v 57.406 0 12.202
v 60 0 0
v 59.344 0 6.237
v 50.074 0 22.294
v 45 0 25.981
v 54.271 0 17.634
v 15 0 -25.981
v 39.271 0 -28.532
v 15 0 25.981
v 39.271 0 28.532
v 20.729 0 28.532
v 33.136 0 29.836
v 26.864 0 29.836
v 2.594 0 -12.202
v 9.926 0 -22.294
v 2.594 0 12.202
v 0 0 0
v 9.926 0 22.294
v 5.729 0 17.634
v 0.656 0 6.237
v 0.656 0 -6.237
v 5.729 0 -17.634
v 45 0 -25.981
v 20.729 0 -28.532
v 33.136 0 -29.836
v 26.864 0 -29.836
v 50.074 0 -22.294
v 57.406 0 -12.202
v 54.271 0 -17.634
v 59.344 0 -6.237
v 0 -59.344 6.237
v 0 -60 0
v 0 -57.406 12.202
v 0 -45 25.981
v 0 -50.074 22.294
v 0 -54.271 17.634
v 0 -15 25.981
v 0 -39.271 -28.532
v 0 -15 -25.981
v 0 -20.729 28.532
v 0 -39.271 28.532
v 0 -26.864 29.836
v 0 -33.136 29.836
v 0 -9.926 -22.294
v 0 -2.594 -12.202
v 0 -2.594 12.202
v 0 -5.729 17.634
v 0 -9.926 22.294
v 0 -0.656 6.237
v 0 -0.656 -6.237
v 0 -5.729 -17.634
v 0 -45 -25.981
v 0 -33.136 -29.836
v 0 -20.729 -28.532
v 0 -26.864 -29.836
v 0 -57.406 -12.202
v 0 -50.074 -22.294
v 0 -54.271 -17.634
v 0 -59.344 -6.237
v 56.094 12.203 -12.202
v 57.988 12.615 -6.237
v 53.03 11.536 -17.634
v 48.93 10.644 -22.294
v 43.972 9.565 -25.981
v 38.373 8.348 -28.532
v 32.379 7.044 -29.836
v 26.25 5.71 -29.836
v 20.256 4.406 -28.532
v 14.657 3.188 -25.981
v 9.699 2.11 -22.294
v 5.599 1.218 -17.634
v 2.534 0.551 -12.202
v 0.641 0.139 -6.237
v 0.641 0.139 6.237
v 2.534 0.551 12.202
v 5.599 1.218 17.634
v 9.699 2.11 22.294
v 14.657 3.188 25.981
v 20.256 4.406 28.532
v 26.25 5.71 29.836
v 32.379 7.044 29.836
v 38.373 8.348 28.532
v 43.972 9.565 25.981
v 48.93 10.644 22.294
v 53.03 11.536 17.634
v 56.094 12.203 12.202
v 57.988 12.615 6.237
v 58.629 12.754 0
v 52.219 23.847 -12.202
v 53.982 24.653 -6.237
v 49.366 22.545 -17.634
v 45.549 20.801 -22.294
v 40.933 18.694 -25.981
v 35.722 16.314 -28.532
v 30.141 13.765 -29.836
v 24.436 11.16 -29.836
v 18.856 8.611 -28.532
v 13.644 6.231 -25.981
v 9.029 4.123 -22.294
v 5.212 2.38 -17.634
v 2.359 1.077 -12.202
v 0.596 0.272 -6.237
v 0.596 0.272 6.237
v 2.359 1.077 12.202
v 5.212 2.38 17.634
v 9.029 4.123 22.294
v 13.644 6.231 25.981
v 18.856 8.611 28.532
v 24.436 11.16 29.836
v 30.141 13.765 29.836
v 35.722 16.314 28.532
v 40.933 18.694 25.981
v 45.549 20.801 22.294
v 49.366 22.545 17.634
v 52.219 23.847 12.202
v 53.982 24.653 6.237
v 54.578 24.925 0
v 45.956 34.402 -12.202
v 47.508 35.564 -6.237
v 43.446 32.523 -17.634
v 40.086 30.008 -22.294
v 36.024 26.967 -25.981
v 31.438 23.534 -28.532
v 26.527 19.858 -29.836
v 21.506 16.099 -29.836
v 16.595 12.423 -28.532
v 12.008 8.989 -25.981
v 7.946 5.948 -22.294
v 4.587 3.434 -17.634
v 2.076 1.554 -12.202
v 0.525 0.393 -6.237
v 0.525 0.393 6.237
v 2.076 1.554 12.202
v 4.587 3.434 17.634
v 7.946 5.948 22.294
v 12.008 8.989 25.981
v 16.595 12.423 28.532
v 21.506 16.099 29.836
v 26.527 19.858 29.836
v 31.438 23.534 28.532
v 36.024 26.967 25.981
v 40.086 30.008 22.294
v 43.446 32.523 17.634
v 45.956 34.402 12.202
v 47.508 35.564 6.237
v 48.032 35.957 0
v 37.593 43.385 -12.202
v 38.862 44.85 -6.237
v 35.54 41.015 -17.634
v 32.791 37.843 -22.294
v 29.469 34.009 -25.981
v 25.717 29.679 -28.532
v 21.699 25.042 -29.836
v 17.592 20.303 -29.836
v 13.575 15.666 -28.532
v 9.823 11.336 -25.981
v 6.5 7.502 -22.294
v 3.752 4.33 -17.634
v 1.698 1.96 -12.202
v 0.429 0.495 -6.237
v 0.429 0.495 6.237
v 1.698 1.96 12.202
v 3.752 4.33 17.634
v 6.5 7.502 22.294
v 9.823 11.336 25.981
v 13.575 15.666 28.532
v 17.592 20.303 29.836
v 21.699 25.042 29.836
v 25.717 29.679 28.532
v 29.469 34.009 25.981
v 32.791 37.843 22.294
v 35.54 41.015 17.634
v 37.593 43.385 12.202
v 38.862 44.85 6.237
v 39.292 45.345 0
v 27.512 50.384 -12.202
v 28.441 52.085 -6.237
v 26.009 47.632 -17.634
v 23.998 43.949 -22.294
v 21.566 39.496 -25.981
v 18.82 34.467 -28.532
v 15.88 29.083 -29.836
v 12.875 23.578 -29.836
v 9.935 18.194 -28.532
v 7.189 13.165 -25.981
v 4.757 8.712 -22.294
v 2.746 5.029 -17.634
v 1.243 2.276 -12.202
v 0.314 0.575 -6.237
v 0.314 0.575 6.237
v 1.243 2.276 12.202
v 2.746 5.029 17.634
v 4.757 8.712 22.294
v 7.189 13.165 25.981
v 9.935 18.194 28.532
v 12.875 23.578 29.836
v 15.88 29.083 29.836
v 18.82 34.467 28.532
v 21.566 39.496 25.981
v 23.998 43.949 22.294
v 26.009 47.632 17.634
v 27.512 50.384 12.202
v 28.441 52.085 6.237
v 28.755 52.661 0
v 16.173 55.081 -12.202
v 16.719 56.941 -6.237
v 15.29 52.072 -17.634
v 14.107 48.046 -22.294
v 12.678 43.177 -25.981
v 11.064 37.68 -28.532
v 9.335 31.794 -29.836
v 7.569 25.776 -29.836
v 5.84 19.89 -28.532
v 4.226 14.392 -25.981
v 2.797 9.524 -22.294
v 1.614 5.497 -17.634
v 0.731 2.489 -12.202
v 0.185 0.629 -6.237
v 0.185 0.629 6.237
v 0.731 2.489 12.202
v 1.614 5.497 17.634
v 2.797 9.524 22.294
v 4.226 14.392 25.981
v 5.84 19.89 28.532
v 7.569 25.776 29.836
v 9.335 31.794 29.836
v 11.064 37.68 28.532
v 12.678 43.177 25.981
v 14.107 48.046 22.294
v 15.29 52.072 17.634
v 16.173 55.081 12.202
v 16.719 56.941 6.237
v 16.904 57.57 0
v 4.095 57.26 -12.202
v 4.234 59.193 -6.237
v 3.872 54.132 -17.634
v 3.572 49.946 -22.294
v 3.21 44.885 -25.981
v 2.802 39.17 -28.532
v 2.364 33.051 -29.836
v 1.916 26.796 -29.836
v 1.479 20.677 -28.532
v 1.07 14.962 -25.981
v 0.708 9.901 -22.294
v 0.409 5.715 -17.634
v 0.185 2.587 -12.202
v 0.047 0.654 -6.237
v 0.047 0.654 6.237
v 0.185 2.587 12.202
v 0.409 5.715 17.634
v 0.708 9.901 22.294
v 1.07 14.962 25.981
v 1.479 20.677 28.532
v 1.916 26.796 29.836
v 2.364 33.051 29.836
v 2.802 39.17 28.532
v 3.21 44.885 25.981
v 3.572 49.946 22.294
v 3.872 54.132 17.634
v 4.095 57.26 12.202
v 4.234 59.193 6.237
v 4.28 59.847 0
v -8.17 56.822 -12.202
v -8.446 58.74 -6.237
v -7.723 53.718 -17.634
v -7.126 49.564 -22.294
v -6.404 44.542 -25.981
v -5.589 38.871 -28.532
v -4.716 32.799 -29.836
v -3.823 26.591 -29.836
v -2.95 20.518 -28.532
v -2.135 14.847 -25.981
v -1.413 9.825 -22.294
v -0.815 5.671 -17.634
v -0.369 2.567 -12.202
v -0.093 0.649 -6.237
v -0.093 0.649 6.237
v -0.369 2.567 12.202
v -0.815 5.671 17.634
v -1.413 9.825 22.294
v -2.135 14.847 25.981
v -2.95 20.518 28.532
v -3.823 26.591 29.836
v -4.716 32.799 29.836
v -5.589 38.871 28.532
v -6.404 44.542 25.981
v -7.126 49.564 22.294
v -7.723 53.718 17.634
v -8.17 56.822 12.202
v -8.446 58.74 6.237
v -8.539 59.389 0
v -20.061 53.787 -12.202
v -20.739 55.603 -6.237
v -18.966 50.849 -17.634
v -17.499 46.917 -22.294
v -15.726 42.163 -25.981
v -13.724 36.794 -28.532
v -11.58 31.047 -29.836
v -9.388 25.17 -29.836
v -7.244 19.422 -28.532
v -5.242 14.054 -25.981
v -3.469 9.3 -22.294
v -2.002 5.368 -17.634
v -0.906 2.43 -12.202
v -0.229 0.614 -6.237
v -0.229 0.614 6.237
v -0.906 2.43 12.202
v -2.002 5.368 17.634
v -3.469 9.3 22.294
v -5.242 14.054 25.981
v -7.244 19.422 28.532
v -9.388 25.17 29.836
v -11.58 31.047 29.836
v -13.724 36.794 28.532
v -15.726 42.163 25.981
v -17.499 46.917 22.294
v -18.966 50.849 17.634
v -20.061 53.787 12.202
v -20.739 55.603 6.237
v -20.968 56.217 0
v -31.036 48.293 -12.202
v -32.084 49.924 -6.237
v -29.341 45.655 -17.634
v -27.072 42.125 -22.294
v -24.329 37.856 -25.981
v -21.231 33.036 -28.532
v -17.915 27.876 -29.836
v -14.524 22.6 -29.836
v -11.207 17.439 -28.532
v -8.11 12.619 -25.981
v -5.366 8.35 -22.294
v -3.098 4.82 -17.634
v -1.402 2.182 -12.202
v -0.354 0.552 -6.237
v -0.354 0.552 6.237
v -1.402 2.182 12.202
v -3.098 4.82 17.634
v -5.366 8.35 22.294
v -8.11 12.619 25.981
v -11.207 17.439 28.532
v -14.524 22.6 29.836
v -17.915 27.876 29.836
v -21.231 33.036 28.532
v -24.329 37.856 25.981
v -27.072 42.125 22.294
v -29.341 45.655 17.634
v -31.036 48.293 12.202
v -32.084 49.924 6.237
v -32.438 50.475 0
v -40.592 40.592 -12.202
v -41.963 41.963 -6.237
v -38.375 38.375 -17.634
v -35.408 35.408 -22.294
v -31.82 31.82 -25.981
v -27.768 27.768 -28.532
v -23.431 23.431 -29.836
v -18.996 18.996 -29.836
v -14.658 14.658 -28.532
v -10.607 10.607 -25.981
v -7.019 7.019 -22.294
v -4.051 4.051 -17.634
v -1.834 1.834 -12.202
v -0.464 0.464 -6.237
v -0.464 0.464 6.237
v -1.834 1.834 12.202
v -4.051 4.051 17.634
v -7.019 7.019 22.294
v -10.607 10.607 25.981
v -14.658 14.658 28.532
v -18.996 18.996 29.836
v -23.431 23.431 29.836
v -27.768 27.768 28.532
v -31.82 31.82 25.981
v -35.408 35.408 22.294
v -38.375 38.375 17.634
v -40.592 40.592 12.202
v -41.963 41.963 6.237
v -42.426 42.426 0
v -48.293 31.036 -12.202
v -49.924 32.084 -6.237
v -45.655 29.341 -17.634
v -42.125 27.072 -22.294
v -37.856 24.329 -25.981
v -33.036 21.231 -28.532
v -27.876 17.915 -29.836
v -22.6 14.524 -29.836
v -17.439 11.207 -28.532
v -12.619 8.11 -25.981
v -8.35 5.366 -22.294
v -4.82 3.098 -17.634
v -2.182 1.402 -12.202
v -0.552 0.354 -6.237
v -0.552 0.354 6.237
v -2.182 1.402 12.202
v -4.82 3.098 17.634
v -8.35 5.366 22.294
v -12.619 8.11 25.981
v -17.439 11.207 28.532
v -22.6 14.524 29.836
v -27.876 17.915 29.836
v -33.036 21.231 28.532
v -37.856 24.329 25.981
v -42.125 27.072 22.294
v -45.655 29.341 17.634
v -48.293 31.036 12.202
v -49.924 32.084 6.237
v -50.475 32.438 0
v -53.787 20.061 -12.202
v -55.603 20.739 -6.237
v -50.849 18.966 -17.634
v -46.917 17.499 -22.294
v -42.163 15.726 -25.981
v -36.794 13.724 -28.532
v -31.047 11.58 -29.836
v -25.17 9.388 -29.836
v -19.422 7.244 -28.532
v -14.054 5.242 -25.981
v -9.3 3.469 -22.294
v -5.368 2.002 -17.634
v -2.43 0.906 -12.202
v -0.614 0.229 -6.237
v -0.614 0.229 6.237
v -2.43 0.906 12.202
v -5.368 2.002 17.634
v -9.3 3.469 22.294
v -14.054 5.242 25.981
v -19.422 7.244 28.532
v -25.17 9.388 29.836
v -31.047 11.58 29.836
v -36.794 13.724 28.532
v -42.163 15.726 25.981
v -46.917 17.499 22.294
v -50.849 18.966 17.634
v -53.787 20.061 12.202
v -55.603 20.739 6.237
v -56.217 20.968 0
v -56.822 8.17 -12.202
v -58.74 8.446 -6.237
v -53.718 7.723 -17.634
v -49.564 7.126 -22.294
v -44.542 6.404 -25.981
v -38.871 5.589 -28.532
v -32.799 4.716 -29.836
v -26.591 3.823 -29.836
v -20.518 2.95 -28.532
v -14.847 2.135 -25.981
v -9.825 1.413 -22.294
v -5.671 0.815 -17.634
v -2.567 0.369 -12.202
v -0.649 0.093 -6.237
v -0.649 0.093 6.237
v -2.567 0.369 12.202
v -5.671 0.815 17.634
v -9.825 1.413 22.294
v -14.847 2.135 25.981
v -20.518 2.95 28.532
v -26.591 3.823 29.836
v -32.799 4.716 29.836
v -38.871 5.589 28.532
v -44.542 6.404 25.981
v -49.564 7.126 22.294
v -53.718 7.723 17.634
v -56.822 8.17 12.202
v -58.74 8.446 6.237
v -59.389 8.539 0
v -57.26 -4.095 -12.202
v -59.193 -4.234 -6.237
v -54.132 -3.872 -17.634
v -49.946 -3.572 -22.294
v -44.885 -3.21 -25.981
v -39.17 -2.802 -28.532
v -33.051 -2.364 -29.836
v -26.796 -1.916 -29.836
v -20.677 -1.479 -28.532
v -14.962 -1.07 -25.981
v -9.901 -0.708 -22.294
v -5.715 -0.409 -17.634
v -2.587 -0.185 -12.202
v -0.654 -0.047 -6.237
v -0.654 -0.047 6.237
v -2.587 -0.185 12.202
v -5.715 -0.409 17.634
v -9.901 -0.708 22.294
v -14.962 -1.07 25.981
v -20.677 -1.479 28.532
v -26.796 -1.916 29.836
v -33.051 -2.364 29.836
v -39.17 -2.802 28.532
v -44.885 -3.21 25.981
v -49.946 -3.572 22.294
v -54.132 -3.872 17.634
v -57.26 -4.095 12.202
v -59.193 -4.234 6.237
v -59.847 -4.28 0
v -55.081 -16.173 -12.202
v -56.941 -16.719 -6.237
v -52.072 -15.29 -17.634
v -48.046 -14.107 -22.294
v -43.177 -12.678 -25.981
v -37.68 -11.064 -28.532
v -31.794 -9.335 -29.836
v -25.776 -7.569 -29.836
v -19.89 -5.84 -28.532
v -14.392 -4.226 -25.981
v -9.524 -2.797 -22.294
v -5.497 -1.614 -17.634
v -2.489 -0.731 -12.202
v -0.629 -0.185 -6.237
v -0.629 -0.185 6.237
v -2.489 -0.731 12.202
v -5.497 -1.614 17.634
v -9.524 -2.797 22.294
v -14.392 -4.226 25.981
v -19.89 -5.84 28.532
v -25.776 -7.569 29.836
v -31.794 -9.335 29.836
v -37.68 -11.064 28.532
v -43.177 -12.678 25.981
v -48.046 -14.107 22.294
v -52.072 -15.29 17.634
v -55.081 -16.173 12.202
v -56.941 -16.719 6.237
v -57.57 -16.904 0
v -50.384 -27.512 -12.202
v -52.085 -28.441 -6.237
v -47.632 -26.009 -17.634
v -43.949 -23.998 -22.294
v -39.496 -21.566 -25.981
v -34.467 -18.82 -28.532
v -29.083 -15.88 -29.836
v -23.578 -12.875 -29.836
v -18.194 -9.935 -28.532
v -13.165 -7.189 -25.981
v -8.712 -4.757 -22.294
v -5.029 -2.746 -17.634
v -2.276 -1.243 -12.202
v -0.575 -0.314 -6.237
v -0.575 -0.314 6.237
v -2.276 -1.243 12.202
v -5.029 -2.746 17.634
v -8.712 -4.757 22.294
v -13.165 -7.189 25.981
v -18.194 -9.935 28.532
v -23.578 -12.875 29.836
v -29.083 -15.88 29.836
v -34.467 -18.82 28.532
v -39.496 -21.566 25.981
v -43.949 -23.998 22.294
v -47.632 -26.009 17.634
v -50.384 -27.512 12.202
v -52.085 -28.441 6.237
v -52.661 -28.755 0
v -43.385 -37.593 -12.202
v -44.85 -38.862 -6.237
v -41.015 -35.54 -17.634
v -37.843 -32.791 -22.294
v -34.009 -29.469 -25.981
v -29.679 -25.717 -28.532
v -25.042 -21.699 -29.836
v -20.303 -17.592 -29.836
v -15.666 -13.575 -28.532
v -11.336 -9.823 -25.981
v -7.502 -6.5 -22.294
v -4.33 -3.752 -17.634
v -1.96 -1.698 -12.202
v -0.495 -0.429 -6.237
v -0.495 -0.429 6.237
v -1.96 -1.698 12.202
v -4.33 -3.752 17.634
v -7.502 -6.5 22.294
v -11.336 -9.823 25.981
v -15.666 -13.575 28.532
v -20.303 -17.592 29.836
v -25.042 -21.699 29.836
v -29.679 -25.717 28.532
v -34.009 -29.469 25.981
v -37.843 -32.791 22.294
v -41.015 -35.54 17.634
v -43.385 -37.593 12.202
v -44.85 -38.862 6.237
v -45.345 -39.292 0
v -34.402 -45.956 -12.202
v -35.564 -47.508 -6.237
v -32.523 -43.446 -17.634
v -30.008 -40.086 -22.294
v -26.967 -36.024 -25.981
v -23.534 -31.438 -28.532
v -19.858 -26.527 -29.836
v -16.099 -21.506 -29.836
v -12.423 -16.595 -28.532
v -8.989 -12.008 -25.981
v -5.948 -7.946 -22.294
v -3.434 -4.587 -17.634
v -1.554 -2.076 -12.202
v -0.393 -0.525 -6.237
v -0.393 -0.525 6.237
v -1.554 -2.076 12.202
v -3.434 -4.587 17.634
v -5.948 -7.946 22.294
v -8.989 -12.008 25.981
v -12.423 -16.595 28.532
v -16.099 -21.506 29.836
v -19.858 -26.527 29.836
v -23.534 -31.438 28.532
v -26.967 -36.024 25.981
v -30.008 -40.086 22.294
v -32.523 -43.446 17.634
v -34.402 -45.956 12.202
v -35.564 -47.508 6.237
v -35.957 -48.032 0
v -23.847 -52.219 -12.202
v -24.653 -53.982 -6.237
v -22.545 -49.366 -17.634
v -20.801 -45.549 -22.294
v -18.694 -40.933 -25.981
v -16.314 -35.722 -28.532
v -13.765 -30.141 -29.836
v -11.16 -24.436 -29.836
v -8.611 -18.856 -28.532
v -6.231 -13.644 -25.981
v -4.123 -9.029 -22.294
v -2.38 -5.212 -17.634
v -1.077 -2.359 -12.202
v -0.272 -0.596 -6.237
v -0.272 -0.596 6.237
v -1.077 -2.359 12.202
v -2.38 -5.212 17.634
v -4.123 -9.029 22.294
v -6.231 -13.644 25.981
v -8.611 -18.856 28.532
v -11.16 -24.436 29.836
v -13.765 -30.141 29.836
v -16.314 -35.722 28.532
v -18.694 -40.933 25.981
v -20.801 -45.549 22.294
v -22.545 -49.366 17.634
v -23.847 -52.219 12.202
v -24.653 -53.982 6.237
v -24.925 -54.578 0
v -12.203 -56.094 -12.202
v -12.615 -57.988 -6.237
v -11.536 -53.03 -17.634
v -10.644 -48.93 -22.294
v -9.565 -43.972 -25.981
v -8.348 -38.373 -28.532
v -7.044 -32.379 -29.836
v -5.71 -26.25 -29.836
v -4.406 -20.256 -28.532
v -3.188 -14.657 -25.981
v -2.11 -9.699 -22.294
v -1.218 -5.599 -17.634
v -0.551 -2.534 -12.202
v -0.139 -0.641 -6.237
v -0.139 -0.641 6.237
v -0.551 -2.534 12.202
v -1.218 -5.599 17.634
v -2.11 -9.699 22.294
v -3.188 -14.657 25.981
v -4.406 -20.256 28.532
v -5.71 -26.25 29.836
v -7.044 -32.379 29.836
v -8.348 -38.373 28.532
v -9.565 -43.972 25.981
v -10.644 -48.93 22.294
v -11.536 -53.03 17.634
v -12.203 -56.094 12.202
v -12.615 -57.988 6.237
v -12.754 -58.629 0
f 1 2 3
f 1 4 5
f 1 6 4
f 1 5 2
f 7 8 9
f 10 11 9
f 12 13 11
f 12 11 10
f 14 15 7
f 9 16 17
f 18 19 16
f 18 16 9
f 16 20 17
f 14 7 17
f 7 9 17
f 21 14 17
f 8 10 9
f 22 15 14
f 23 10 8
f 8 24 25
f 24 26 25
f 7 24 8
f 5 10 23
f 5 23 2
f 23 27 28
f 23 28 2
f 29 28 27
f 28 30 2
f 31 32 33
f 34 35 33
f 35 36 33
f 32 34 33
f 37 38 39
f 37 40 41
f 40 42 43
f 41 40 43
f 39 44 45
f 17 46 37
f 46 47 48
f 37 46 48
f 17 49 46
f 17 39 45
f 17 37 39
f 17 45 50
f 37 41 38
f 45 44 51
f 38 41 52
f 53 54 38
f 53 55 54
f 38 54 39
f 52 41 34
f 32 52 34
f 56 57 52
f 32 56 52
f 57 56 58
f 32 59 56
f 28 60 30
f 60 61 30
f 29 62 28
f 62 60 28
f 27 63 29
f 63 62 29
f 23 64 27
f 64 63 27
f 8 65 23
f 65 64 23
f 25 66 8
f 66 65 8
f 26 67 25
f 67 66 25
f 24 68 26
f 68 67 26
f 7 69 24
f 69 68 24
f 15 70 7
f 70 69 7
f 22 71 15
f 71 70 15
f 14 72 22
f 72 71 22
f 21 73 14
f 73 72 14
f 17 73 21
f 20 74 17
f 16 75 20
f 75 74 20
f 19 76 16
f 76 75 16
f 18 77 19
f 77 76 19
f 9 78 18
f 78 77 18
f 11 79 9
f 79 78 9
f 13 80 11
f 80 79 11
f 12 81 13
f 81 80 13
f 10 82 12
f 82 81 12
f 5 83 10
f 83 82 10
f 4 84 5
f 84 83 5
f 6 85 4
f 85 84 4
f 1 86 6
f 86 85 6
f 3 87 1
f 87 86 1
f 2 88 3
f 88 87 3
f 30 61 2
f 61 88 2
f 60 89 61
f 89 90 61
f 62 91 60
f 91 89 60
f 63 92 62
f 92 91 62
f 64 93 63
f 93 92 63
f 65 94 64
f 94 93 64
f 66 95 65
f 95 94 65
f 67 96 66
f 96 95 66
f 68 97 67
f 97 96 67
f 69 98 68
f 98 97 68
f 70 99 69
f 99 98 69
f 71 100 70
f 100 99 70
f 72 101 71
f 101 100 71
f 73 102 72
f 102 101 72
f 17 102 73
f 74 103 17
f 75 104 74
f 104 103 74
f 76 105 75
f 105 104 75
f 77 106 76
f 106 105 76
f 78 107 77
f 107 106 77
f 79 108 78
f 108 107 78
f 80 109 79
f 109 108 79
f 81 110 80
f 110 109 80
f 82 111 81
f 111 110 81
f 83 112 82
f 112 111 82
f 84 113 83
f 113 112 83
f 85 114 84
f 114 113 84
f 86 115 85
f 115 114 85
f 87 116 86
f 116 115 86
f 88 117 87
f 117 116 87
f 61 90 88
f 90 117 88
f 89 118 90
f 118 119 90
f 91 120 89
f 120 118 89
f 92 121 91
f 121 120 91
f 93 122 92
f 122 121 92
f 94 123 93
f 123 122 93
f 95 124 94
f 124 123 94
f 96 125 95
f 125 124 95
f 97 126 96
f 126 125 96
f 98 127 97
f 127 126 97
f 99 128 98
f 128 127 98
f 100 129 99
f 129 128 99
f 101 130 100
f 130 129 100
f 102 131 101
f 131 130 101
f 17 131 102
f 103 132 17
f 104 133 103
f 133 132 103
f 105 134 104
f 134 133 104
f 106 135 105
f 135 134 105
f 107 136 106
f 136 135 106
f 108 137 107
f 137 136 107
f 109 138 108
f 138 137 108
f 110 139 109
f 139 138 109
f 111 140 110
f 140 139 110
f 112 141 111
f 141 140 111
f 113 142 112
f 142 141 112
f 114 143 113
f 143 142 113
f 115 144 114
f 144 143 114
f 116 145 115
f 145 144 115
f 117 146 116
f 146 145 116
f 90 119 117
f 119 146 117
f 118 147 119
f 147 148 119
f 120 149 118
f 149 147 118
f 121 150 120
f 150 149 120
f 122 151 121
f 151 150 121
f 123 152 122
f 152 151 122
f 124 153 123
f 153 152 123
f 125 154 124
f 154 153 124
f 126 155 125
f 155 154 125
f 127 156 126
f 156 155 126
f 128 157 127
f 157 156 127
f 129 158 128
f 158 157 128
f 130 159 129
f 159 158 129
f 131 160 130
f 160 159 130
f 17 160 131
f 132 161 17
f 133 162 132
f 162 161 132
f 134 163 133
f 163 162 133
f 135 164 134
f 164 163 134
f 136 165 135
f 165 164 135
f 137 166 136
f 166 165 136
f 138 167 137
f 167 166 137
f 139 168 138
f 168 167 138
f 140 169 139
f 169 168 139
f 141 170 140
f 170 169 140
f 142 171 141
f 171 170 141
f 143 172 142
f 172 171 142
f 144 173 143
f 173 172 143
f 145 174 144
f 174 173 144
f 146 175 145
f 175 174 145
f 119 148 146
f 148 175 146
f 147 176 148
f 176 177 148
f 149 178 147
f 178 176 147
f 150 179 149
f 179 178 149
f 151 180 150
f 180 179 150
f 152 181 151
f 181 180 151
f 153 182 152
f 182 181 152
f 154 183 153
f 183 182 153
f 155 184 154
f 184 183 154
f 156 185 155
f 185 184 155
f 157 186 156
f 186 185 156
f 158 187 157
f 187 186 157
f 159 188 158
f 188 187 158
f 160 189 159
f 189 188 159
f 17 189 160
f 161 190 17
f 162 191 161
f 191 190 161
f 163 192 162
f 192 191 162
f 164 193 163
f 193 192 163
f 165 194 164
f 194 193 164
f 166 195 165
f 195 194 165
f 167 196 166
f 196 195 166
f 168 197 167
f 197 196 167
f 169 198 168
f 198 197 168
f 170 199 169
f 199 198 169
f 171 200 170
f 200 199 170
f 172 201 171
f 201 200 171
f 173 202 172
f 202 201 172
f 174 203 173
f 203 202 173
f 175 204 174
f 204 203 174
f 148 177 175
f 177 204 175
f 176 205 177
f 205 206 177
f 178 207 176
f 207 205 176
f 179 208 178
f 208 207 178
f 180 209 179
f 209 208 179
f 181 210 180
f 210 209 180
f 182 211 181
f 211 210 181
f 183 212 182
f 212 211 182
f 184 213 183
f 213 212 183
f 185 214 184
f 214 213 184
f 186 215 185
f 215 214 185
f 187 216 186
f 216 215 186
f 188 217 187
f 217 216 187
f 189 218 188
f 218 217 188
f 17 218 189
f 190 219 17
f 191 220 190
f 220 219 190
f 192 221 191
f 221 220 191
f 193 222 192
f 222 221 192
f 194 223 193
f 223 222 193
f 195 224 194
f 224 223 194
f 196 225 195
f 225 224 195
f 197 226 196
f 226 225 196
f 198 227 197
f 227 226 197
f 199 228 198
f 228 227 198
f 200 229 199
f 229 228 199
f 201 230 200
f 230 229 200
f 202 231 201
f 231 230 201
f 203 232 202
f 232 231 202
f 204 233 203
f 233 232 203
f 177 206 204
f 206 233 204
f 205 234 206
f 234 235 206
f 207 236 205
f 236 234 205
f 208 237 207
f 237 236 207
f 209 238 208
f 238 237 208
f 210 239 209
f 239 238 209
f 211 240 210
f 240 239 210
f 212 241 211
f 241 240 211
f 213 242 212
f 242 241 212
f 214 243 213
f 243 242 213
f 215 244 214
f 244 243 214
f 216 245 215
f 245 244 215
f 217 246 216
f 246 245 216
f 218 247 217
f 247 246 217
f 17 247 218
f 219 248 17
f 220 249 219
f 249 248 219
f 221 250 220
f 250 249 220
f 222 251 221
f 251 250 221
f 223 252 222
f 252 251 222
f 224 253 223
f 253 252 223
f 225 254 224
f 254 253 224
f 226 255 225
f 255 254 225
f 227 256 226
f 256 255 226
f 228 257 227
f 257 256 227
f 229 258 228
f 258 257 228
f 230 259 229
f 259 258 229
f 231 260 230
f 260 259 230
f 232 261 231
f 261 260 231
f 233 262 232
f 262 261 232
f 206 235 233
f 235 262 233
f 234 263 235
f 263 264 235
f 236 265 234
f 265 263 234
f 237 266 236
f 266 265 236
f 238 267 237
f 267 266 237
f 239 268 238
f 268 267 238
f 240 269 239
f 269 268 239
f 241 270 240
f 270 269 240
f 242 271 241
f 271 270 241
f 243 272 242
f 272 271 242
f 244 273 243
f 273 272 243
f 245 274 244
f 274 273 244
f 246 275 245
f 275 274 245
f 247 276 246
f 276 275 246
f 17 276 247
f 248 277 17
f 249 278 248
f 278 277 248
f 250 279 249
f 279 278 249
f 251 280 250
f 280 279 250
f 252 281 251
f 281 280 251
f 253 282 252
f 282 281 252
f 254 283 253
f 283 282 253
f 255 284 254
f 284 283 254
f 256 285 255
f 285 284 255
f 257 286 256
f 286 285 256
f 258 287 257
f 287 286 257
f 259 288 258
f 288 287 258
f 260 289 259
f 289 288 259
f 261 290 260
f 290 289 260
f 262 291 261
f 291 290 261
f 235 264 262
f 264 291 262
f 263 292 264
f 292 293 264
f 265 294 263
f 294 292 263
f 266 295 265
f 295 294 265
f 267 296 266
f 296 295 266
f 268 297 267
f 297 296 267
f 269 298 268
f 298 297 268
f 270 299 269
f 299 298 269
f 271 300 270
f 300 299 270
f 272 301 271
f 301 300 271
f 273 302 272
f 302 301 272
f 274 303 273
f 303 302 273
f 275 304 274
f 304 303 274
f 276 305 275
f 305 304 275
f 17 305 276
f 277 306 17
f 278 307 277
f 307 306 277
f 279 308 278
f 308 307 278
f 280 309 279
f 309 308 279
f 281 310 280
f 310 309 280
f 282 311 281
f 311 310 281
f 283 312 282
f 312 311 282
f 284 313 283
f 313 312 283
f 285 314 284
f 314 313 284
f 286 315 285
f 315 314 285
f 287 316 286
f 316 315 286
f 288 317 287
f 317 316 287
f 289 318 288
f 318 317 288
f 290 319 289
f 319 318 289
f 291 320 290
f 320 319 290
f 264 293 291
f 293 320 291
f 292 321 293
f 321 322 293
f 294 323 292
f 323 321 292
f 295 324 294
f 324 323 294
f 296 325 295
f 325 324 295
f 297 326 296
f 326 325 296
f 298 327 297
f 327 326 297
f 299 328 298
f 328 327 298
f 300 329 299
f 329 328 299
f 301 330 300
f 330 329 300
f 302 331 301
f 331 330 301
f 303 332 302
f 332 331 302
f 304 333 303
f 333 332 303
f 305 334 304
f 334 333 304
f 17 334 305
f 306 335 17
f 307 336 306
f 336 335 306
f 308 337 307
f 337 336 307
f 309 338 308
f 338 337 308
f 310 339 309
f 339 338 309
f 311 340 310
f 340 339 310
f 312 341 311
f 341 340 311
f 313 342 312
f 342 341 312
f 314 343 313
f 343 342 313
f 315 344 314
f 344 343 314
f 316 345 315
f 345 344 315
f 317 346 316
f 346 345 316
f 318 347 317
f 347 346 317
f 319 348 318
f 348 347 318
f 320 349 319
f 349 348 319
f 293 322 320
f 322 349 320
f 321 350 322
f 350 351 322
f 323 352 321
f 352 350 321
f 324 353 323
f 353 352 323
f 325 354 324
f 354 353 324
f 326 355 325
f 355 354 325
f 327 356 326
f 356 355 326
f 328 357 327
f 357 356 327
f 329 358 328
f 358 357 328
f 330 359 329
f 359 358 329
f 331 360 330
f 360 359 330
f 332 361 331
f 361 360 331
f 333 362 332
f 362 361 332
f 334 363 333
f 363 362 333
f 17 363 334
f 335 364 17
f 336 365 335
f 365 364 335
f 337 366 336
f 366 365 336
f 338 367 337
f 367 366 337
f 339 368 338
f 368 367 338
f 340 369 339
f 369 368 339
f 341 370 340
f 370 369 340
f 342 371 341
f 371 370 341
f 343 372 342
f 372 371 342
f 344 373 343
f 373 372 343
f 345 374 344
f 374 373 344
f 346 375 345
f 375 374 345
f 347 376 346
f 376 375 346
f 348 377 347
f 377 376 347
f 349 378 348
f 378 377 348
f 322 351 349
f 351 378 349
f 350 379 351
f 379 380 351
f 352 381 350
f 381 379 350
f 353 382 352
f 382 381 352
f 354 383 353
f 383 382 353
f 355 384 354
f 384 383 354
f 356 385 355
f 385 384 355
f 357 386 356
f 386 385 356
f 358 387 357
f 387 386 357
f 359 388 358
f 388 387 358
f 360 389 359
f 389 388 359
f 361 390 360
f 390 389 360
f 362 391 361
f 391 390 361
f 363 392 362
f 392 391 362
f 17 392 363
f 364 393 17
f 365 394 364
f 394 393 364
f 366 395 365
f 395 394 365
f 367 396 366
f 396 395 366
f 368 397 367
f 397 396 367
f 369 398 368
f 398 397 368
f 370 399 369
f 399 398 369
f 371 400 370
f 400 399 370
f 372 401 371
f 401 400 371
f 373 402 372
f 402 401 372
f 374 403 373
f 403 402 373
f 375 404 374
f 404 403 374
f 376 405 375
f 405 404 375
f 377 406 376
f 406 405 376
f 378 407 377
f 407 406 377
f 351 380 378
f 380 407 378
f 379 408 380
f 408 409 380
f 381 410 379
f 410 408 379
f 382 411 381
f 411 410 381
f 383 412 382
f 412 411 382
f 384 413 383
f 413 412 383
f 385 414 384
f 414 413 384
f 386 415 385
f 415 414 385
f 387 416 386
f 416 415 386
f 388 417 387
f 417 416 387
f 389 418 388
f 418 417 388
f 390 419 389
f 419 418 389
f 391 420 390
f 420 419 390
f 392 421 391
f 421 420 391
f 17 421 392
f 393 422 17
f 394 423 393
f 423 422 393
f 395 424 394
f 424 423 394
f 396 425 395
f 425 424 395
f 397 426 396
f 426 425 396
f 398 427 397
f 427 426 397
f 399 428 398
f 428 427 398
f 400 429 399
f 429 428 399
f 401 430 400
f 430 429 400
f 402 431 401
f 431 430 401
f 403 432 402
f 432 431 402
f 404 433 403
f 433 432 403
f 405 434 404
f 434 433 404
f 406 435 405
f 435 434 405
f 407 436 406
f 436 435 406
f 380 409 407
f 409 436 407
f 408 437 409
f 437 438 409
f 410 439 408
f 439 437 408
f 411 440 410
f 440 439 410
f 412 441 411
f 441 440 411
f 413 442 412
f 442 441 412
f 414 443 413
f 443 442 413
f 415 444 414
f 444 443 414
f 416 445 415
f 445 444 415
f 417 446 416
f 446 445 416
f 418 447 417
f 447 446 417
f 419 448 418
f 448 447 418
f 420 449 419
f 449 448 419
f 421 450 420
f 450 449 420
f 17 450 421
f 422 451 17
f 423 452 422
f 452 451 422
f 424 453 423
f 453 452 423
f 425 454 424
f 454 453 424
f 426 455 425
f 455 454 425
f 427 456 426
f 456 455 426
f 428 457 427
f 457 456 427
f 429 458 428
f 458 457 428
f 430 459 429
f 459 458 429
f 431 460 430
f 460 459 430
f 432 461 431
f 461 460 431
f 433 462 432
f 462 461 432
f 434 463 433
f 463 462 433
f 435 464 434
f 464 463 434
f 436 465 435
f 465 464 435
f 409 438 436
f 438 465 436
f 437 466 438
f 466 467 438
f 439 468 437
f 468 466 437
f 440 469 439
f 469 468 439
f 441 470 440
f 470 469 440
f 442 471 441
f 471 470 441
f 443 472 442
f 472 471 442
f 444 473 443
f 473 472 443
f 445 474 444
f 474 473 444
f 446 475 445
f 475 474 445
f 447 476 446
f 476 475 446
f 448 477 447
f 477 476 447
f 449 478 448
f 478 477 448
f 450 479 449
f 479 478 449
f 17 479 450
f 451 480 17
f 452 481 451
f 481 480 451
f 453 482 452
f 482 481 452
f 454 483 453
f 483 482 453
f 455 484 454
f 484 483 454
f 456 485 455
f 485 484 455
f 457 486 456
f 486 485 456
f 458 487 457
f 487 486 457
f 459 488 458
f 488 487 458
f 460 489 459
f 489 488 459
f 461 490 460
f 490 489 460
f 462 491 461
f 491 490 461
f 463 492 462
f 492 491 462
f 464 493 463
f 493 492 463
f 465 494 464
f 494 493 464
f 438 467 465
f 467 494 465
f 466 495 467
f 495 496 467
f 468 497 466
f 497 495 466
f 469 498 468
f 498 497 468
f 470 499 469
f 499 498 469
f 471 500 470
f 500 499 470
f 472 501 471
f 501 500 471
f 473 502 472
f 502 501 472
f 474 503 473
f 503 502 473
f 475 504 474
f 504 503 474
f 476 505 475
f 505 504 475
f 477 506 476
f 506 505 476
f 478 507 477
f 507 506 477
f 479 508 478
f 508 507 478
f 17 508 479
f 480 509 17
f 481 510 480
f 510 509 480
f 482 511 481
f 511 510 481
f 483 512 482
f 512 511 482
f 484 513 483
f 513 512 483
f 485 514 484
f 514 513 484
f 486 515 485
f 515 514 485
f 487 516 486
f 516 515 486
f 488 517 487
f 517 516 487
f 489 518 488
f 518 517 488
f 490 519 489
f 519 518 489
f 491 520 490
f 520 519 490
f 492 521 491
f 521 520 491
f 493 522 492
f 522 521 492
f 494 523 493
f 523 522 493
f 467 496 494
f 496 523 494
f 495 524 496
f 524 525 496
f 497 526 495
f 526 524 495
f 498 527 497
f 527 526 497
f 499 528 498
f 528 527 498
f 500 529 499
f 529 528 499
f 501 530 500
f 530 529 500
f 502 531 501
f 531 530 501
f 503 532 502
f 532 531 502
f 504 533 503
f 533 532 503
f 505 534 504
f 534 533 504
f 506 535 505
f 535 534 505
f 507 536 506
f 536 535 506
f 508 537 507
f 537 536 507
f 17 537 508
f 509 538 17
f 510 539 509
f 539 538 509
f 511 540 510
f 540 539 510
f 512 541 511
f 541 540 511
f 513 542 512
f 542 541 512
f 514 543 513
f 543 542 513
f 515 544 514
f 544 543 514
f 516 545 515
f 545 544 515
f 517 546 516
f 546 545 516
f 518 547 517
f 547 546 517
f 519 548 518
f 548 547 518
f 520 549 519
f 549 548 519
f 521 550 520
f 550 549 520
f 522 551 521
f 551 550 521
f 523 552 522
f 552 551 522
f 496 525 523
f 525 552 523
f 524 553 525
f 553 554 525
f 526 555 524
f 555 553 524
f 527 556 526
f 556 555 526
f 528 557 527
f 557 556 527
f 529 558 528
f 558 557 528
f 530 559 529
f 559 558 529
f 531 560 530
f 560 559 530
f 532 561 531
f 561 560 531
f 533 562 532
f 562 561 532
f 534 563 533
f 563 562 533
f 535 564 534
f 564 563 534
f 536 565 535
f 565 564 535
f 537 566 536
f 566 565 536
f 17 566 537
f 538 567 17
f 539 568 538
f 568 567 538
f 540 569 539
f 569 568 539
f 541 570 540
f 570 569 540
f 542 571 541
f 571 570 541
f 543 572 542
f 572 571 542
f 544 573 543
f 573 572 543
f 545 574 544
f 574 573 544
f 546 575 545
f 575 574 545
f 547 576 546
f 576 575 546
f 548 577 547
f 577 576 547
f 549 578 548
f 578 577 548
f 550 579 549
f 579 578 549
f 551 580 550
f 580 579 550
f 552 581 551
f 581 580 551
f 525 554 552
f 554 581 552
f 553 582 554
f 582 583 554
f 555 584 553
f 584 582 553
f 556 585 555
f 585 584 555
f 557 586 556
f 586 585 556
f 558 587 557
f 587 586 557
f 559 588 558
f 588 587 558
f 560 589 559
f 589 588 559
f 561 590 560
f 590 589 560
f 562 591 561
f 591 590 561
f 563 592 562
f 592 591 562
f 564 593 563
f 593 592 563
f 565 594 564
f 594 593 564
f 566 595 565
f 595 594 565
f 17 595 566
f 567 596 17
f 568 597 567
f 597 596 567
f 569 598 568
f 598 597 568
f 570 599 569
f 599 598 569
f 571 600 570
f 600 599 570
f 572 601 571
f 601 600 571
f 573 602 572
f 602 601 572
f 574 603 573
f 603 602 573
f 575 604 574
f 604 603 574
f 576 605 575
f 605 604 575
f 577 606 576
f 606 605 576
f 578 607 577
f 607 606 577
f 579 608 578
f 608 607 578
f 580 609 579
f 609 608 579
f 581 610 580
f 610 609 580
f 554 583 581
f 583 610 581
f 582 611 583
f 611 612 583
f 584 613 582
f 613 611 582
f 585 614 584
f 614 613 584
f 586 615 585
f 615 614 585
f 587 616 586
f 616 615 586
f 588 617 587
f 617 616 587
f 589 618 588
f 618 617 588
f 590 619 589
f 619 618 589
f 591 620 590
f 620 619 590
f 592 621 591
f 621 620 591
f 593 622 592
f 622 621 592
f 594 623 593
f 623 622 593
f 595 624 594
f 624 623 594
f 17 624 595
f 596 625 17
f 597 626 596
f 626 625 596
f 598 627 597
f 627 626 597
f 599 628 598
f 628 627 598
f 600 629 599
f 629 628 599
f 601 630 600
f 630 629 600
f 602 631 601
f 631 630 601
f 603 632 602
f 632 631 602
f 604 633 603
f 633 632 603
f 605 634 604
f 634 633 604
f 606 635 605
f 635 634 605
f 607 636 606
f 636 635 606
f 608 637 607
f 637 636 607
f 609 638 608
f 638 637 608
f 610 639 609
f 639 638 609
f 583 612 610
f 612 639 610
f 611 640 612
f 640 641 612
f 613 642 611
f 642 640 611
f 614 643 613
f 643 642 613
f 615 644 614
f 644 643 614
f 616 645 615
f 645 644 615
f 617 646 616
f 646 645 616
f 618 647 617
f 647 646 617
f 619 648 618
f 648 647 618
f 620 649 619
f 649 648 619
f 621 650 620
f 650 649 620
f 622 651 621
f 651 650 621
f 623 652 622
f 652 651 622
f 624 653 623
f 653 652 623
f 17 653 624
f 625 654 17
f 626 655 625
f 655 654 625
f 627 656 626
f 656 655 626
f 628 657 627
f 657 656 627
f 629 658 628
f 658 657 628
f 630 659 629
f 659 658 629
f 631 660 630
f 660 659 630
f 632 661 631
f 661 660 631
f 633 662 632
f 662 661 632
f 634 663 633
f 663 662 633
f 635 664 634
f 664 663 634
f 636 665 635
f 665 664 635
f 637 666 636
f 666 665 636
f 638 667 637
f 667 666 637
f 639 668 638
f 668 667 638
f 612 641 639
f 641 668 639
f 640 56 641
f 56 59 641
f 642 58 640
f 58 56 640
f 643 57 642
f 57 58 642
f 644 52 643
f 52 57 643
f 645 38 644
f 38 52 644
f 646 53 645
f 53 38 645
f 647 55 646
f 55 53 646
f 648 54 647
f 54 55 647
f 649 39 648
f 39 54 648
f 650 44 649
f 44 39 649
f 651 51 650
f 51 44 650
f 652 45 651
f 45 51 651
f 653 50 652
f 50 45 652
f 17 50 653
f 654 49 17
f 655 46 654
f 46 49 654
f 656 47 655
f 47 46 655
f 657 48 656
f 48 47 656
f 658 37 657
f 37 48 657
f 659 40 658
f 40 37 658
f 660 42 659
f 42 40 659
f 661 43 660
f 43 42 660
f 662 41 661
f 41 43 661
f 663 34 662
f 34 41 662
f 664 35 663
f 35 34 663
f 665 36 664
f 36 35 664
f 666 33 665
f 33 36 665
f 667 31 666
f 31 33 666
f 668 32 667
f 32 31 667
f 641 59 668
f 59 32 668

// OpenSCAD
rotate_extrude(angle = 270, convexity = 10)
    translate([30, 0, 0])
        circle(r = 30);
